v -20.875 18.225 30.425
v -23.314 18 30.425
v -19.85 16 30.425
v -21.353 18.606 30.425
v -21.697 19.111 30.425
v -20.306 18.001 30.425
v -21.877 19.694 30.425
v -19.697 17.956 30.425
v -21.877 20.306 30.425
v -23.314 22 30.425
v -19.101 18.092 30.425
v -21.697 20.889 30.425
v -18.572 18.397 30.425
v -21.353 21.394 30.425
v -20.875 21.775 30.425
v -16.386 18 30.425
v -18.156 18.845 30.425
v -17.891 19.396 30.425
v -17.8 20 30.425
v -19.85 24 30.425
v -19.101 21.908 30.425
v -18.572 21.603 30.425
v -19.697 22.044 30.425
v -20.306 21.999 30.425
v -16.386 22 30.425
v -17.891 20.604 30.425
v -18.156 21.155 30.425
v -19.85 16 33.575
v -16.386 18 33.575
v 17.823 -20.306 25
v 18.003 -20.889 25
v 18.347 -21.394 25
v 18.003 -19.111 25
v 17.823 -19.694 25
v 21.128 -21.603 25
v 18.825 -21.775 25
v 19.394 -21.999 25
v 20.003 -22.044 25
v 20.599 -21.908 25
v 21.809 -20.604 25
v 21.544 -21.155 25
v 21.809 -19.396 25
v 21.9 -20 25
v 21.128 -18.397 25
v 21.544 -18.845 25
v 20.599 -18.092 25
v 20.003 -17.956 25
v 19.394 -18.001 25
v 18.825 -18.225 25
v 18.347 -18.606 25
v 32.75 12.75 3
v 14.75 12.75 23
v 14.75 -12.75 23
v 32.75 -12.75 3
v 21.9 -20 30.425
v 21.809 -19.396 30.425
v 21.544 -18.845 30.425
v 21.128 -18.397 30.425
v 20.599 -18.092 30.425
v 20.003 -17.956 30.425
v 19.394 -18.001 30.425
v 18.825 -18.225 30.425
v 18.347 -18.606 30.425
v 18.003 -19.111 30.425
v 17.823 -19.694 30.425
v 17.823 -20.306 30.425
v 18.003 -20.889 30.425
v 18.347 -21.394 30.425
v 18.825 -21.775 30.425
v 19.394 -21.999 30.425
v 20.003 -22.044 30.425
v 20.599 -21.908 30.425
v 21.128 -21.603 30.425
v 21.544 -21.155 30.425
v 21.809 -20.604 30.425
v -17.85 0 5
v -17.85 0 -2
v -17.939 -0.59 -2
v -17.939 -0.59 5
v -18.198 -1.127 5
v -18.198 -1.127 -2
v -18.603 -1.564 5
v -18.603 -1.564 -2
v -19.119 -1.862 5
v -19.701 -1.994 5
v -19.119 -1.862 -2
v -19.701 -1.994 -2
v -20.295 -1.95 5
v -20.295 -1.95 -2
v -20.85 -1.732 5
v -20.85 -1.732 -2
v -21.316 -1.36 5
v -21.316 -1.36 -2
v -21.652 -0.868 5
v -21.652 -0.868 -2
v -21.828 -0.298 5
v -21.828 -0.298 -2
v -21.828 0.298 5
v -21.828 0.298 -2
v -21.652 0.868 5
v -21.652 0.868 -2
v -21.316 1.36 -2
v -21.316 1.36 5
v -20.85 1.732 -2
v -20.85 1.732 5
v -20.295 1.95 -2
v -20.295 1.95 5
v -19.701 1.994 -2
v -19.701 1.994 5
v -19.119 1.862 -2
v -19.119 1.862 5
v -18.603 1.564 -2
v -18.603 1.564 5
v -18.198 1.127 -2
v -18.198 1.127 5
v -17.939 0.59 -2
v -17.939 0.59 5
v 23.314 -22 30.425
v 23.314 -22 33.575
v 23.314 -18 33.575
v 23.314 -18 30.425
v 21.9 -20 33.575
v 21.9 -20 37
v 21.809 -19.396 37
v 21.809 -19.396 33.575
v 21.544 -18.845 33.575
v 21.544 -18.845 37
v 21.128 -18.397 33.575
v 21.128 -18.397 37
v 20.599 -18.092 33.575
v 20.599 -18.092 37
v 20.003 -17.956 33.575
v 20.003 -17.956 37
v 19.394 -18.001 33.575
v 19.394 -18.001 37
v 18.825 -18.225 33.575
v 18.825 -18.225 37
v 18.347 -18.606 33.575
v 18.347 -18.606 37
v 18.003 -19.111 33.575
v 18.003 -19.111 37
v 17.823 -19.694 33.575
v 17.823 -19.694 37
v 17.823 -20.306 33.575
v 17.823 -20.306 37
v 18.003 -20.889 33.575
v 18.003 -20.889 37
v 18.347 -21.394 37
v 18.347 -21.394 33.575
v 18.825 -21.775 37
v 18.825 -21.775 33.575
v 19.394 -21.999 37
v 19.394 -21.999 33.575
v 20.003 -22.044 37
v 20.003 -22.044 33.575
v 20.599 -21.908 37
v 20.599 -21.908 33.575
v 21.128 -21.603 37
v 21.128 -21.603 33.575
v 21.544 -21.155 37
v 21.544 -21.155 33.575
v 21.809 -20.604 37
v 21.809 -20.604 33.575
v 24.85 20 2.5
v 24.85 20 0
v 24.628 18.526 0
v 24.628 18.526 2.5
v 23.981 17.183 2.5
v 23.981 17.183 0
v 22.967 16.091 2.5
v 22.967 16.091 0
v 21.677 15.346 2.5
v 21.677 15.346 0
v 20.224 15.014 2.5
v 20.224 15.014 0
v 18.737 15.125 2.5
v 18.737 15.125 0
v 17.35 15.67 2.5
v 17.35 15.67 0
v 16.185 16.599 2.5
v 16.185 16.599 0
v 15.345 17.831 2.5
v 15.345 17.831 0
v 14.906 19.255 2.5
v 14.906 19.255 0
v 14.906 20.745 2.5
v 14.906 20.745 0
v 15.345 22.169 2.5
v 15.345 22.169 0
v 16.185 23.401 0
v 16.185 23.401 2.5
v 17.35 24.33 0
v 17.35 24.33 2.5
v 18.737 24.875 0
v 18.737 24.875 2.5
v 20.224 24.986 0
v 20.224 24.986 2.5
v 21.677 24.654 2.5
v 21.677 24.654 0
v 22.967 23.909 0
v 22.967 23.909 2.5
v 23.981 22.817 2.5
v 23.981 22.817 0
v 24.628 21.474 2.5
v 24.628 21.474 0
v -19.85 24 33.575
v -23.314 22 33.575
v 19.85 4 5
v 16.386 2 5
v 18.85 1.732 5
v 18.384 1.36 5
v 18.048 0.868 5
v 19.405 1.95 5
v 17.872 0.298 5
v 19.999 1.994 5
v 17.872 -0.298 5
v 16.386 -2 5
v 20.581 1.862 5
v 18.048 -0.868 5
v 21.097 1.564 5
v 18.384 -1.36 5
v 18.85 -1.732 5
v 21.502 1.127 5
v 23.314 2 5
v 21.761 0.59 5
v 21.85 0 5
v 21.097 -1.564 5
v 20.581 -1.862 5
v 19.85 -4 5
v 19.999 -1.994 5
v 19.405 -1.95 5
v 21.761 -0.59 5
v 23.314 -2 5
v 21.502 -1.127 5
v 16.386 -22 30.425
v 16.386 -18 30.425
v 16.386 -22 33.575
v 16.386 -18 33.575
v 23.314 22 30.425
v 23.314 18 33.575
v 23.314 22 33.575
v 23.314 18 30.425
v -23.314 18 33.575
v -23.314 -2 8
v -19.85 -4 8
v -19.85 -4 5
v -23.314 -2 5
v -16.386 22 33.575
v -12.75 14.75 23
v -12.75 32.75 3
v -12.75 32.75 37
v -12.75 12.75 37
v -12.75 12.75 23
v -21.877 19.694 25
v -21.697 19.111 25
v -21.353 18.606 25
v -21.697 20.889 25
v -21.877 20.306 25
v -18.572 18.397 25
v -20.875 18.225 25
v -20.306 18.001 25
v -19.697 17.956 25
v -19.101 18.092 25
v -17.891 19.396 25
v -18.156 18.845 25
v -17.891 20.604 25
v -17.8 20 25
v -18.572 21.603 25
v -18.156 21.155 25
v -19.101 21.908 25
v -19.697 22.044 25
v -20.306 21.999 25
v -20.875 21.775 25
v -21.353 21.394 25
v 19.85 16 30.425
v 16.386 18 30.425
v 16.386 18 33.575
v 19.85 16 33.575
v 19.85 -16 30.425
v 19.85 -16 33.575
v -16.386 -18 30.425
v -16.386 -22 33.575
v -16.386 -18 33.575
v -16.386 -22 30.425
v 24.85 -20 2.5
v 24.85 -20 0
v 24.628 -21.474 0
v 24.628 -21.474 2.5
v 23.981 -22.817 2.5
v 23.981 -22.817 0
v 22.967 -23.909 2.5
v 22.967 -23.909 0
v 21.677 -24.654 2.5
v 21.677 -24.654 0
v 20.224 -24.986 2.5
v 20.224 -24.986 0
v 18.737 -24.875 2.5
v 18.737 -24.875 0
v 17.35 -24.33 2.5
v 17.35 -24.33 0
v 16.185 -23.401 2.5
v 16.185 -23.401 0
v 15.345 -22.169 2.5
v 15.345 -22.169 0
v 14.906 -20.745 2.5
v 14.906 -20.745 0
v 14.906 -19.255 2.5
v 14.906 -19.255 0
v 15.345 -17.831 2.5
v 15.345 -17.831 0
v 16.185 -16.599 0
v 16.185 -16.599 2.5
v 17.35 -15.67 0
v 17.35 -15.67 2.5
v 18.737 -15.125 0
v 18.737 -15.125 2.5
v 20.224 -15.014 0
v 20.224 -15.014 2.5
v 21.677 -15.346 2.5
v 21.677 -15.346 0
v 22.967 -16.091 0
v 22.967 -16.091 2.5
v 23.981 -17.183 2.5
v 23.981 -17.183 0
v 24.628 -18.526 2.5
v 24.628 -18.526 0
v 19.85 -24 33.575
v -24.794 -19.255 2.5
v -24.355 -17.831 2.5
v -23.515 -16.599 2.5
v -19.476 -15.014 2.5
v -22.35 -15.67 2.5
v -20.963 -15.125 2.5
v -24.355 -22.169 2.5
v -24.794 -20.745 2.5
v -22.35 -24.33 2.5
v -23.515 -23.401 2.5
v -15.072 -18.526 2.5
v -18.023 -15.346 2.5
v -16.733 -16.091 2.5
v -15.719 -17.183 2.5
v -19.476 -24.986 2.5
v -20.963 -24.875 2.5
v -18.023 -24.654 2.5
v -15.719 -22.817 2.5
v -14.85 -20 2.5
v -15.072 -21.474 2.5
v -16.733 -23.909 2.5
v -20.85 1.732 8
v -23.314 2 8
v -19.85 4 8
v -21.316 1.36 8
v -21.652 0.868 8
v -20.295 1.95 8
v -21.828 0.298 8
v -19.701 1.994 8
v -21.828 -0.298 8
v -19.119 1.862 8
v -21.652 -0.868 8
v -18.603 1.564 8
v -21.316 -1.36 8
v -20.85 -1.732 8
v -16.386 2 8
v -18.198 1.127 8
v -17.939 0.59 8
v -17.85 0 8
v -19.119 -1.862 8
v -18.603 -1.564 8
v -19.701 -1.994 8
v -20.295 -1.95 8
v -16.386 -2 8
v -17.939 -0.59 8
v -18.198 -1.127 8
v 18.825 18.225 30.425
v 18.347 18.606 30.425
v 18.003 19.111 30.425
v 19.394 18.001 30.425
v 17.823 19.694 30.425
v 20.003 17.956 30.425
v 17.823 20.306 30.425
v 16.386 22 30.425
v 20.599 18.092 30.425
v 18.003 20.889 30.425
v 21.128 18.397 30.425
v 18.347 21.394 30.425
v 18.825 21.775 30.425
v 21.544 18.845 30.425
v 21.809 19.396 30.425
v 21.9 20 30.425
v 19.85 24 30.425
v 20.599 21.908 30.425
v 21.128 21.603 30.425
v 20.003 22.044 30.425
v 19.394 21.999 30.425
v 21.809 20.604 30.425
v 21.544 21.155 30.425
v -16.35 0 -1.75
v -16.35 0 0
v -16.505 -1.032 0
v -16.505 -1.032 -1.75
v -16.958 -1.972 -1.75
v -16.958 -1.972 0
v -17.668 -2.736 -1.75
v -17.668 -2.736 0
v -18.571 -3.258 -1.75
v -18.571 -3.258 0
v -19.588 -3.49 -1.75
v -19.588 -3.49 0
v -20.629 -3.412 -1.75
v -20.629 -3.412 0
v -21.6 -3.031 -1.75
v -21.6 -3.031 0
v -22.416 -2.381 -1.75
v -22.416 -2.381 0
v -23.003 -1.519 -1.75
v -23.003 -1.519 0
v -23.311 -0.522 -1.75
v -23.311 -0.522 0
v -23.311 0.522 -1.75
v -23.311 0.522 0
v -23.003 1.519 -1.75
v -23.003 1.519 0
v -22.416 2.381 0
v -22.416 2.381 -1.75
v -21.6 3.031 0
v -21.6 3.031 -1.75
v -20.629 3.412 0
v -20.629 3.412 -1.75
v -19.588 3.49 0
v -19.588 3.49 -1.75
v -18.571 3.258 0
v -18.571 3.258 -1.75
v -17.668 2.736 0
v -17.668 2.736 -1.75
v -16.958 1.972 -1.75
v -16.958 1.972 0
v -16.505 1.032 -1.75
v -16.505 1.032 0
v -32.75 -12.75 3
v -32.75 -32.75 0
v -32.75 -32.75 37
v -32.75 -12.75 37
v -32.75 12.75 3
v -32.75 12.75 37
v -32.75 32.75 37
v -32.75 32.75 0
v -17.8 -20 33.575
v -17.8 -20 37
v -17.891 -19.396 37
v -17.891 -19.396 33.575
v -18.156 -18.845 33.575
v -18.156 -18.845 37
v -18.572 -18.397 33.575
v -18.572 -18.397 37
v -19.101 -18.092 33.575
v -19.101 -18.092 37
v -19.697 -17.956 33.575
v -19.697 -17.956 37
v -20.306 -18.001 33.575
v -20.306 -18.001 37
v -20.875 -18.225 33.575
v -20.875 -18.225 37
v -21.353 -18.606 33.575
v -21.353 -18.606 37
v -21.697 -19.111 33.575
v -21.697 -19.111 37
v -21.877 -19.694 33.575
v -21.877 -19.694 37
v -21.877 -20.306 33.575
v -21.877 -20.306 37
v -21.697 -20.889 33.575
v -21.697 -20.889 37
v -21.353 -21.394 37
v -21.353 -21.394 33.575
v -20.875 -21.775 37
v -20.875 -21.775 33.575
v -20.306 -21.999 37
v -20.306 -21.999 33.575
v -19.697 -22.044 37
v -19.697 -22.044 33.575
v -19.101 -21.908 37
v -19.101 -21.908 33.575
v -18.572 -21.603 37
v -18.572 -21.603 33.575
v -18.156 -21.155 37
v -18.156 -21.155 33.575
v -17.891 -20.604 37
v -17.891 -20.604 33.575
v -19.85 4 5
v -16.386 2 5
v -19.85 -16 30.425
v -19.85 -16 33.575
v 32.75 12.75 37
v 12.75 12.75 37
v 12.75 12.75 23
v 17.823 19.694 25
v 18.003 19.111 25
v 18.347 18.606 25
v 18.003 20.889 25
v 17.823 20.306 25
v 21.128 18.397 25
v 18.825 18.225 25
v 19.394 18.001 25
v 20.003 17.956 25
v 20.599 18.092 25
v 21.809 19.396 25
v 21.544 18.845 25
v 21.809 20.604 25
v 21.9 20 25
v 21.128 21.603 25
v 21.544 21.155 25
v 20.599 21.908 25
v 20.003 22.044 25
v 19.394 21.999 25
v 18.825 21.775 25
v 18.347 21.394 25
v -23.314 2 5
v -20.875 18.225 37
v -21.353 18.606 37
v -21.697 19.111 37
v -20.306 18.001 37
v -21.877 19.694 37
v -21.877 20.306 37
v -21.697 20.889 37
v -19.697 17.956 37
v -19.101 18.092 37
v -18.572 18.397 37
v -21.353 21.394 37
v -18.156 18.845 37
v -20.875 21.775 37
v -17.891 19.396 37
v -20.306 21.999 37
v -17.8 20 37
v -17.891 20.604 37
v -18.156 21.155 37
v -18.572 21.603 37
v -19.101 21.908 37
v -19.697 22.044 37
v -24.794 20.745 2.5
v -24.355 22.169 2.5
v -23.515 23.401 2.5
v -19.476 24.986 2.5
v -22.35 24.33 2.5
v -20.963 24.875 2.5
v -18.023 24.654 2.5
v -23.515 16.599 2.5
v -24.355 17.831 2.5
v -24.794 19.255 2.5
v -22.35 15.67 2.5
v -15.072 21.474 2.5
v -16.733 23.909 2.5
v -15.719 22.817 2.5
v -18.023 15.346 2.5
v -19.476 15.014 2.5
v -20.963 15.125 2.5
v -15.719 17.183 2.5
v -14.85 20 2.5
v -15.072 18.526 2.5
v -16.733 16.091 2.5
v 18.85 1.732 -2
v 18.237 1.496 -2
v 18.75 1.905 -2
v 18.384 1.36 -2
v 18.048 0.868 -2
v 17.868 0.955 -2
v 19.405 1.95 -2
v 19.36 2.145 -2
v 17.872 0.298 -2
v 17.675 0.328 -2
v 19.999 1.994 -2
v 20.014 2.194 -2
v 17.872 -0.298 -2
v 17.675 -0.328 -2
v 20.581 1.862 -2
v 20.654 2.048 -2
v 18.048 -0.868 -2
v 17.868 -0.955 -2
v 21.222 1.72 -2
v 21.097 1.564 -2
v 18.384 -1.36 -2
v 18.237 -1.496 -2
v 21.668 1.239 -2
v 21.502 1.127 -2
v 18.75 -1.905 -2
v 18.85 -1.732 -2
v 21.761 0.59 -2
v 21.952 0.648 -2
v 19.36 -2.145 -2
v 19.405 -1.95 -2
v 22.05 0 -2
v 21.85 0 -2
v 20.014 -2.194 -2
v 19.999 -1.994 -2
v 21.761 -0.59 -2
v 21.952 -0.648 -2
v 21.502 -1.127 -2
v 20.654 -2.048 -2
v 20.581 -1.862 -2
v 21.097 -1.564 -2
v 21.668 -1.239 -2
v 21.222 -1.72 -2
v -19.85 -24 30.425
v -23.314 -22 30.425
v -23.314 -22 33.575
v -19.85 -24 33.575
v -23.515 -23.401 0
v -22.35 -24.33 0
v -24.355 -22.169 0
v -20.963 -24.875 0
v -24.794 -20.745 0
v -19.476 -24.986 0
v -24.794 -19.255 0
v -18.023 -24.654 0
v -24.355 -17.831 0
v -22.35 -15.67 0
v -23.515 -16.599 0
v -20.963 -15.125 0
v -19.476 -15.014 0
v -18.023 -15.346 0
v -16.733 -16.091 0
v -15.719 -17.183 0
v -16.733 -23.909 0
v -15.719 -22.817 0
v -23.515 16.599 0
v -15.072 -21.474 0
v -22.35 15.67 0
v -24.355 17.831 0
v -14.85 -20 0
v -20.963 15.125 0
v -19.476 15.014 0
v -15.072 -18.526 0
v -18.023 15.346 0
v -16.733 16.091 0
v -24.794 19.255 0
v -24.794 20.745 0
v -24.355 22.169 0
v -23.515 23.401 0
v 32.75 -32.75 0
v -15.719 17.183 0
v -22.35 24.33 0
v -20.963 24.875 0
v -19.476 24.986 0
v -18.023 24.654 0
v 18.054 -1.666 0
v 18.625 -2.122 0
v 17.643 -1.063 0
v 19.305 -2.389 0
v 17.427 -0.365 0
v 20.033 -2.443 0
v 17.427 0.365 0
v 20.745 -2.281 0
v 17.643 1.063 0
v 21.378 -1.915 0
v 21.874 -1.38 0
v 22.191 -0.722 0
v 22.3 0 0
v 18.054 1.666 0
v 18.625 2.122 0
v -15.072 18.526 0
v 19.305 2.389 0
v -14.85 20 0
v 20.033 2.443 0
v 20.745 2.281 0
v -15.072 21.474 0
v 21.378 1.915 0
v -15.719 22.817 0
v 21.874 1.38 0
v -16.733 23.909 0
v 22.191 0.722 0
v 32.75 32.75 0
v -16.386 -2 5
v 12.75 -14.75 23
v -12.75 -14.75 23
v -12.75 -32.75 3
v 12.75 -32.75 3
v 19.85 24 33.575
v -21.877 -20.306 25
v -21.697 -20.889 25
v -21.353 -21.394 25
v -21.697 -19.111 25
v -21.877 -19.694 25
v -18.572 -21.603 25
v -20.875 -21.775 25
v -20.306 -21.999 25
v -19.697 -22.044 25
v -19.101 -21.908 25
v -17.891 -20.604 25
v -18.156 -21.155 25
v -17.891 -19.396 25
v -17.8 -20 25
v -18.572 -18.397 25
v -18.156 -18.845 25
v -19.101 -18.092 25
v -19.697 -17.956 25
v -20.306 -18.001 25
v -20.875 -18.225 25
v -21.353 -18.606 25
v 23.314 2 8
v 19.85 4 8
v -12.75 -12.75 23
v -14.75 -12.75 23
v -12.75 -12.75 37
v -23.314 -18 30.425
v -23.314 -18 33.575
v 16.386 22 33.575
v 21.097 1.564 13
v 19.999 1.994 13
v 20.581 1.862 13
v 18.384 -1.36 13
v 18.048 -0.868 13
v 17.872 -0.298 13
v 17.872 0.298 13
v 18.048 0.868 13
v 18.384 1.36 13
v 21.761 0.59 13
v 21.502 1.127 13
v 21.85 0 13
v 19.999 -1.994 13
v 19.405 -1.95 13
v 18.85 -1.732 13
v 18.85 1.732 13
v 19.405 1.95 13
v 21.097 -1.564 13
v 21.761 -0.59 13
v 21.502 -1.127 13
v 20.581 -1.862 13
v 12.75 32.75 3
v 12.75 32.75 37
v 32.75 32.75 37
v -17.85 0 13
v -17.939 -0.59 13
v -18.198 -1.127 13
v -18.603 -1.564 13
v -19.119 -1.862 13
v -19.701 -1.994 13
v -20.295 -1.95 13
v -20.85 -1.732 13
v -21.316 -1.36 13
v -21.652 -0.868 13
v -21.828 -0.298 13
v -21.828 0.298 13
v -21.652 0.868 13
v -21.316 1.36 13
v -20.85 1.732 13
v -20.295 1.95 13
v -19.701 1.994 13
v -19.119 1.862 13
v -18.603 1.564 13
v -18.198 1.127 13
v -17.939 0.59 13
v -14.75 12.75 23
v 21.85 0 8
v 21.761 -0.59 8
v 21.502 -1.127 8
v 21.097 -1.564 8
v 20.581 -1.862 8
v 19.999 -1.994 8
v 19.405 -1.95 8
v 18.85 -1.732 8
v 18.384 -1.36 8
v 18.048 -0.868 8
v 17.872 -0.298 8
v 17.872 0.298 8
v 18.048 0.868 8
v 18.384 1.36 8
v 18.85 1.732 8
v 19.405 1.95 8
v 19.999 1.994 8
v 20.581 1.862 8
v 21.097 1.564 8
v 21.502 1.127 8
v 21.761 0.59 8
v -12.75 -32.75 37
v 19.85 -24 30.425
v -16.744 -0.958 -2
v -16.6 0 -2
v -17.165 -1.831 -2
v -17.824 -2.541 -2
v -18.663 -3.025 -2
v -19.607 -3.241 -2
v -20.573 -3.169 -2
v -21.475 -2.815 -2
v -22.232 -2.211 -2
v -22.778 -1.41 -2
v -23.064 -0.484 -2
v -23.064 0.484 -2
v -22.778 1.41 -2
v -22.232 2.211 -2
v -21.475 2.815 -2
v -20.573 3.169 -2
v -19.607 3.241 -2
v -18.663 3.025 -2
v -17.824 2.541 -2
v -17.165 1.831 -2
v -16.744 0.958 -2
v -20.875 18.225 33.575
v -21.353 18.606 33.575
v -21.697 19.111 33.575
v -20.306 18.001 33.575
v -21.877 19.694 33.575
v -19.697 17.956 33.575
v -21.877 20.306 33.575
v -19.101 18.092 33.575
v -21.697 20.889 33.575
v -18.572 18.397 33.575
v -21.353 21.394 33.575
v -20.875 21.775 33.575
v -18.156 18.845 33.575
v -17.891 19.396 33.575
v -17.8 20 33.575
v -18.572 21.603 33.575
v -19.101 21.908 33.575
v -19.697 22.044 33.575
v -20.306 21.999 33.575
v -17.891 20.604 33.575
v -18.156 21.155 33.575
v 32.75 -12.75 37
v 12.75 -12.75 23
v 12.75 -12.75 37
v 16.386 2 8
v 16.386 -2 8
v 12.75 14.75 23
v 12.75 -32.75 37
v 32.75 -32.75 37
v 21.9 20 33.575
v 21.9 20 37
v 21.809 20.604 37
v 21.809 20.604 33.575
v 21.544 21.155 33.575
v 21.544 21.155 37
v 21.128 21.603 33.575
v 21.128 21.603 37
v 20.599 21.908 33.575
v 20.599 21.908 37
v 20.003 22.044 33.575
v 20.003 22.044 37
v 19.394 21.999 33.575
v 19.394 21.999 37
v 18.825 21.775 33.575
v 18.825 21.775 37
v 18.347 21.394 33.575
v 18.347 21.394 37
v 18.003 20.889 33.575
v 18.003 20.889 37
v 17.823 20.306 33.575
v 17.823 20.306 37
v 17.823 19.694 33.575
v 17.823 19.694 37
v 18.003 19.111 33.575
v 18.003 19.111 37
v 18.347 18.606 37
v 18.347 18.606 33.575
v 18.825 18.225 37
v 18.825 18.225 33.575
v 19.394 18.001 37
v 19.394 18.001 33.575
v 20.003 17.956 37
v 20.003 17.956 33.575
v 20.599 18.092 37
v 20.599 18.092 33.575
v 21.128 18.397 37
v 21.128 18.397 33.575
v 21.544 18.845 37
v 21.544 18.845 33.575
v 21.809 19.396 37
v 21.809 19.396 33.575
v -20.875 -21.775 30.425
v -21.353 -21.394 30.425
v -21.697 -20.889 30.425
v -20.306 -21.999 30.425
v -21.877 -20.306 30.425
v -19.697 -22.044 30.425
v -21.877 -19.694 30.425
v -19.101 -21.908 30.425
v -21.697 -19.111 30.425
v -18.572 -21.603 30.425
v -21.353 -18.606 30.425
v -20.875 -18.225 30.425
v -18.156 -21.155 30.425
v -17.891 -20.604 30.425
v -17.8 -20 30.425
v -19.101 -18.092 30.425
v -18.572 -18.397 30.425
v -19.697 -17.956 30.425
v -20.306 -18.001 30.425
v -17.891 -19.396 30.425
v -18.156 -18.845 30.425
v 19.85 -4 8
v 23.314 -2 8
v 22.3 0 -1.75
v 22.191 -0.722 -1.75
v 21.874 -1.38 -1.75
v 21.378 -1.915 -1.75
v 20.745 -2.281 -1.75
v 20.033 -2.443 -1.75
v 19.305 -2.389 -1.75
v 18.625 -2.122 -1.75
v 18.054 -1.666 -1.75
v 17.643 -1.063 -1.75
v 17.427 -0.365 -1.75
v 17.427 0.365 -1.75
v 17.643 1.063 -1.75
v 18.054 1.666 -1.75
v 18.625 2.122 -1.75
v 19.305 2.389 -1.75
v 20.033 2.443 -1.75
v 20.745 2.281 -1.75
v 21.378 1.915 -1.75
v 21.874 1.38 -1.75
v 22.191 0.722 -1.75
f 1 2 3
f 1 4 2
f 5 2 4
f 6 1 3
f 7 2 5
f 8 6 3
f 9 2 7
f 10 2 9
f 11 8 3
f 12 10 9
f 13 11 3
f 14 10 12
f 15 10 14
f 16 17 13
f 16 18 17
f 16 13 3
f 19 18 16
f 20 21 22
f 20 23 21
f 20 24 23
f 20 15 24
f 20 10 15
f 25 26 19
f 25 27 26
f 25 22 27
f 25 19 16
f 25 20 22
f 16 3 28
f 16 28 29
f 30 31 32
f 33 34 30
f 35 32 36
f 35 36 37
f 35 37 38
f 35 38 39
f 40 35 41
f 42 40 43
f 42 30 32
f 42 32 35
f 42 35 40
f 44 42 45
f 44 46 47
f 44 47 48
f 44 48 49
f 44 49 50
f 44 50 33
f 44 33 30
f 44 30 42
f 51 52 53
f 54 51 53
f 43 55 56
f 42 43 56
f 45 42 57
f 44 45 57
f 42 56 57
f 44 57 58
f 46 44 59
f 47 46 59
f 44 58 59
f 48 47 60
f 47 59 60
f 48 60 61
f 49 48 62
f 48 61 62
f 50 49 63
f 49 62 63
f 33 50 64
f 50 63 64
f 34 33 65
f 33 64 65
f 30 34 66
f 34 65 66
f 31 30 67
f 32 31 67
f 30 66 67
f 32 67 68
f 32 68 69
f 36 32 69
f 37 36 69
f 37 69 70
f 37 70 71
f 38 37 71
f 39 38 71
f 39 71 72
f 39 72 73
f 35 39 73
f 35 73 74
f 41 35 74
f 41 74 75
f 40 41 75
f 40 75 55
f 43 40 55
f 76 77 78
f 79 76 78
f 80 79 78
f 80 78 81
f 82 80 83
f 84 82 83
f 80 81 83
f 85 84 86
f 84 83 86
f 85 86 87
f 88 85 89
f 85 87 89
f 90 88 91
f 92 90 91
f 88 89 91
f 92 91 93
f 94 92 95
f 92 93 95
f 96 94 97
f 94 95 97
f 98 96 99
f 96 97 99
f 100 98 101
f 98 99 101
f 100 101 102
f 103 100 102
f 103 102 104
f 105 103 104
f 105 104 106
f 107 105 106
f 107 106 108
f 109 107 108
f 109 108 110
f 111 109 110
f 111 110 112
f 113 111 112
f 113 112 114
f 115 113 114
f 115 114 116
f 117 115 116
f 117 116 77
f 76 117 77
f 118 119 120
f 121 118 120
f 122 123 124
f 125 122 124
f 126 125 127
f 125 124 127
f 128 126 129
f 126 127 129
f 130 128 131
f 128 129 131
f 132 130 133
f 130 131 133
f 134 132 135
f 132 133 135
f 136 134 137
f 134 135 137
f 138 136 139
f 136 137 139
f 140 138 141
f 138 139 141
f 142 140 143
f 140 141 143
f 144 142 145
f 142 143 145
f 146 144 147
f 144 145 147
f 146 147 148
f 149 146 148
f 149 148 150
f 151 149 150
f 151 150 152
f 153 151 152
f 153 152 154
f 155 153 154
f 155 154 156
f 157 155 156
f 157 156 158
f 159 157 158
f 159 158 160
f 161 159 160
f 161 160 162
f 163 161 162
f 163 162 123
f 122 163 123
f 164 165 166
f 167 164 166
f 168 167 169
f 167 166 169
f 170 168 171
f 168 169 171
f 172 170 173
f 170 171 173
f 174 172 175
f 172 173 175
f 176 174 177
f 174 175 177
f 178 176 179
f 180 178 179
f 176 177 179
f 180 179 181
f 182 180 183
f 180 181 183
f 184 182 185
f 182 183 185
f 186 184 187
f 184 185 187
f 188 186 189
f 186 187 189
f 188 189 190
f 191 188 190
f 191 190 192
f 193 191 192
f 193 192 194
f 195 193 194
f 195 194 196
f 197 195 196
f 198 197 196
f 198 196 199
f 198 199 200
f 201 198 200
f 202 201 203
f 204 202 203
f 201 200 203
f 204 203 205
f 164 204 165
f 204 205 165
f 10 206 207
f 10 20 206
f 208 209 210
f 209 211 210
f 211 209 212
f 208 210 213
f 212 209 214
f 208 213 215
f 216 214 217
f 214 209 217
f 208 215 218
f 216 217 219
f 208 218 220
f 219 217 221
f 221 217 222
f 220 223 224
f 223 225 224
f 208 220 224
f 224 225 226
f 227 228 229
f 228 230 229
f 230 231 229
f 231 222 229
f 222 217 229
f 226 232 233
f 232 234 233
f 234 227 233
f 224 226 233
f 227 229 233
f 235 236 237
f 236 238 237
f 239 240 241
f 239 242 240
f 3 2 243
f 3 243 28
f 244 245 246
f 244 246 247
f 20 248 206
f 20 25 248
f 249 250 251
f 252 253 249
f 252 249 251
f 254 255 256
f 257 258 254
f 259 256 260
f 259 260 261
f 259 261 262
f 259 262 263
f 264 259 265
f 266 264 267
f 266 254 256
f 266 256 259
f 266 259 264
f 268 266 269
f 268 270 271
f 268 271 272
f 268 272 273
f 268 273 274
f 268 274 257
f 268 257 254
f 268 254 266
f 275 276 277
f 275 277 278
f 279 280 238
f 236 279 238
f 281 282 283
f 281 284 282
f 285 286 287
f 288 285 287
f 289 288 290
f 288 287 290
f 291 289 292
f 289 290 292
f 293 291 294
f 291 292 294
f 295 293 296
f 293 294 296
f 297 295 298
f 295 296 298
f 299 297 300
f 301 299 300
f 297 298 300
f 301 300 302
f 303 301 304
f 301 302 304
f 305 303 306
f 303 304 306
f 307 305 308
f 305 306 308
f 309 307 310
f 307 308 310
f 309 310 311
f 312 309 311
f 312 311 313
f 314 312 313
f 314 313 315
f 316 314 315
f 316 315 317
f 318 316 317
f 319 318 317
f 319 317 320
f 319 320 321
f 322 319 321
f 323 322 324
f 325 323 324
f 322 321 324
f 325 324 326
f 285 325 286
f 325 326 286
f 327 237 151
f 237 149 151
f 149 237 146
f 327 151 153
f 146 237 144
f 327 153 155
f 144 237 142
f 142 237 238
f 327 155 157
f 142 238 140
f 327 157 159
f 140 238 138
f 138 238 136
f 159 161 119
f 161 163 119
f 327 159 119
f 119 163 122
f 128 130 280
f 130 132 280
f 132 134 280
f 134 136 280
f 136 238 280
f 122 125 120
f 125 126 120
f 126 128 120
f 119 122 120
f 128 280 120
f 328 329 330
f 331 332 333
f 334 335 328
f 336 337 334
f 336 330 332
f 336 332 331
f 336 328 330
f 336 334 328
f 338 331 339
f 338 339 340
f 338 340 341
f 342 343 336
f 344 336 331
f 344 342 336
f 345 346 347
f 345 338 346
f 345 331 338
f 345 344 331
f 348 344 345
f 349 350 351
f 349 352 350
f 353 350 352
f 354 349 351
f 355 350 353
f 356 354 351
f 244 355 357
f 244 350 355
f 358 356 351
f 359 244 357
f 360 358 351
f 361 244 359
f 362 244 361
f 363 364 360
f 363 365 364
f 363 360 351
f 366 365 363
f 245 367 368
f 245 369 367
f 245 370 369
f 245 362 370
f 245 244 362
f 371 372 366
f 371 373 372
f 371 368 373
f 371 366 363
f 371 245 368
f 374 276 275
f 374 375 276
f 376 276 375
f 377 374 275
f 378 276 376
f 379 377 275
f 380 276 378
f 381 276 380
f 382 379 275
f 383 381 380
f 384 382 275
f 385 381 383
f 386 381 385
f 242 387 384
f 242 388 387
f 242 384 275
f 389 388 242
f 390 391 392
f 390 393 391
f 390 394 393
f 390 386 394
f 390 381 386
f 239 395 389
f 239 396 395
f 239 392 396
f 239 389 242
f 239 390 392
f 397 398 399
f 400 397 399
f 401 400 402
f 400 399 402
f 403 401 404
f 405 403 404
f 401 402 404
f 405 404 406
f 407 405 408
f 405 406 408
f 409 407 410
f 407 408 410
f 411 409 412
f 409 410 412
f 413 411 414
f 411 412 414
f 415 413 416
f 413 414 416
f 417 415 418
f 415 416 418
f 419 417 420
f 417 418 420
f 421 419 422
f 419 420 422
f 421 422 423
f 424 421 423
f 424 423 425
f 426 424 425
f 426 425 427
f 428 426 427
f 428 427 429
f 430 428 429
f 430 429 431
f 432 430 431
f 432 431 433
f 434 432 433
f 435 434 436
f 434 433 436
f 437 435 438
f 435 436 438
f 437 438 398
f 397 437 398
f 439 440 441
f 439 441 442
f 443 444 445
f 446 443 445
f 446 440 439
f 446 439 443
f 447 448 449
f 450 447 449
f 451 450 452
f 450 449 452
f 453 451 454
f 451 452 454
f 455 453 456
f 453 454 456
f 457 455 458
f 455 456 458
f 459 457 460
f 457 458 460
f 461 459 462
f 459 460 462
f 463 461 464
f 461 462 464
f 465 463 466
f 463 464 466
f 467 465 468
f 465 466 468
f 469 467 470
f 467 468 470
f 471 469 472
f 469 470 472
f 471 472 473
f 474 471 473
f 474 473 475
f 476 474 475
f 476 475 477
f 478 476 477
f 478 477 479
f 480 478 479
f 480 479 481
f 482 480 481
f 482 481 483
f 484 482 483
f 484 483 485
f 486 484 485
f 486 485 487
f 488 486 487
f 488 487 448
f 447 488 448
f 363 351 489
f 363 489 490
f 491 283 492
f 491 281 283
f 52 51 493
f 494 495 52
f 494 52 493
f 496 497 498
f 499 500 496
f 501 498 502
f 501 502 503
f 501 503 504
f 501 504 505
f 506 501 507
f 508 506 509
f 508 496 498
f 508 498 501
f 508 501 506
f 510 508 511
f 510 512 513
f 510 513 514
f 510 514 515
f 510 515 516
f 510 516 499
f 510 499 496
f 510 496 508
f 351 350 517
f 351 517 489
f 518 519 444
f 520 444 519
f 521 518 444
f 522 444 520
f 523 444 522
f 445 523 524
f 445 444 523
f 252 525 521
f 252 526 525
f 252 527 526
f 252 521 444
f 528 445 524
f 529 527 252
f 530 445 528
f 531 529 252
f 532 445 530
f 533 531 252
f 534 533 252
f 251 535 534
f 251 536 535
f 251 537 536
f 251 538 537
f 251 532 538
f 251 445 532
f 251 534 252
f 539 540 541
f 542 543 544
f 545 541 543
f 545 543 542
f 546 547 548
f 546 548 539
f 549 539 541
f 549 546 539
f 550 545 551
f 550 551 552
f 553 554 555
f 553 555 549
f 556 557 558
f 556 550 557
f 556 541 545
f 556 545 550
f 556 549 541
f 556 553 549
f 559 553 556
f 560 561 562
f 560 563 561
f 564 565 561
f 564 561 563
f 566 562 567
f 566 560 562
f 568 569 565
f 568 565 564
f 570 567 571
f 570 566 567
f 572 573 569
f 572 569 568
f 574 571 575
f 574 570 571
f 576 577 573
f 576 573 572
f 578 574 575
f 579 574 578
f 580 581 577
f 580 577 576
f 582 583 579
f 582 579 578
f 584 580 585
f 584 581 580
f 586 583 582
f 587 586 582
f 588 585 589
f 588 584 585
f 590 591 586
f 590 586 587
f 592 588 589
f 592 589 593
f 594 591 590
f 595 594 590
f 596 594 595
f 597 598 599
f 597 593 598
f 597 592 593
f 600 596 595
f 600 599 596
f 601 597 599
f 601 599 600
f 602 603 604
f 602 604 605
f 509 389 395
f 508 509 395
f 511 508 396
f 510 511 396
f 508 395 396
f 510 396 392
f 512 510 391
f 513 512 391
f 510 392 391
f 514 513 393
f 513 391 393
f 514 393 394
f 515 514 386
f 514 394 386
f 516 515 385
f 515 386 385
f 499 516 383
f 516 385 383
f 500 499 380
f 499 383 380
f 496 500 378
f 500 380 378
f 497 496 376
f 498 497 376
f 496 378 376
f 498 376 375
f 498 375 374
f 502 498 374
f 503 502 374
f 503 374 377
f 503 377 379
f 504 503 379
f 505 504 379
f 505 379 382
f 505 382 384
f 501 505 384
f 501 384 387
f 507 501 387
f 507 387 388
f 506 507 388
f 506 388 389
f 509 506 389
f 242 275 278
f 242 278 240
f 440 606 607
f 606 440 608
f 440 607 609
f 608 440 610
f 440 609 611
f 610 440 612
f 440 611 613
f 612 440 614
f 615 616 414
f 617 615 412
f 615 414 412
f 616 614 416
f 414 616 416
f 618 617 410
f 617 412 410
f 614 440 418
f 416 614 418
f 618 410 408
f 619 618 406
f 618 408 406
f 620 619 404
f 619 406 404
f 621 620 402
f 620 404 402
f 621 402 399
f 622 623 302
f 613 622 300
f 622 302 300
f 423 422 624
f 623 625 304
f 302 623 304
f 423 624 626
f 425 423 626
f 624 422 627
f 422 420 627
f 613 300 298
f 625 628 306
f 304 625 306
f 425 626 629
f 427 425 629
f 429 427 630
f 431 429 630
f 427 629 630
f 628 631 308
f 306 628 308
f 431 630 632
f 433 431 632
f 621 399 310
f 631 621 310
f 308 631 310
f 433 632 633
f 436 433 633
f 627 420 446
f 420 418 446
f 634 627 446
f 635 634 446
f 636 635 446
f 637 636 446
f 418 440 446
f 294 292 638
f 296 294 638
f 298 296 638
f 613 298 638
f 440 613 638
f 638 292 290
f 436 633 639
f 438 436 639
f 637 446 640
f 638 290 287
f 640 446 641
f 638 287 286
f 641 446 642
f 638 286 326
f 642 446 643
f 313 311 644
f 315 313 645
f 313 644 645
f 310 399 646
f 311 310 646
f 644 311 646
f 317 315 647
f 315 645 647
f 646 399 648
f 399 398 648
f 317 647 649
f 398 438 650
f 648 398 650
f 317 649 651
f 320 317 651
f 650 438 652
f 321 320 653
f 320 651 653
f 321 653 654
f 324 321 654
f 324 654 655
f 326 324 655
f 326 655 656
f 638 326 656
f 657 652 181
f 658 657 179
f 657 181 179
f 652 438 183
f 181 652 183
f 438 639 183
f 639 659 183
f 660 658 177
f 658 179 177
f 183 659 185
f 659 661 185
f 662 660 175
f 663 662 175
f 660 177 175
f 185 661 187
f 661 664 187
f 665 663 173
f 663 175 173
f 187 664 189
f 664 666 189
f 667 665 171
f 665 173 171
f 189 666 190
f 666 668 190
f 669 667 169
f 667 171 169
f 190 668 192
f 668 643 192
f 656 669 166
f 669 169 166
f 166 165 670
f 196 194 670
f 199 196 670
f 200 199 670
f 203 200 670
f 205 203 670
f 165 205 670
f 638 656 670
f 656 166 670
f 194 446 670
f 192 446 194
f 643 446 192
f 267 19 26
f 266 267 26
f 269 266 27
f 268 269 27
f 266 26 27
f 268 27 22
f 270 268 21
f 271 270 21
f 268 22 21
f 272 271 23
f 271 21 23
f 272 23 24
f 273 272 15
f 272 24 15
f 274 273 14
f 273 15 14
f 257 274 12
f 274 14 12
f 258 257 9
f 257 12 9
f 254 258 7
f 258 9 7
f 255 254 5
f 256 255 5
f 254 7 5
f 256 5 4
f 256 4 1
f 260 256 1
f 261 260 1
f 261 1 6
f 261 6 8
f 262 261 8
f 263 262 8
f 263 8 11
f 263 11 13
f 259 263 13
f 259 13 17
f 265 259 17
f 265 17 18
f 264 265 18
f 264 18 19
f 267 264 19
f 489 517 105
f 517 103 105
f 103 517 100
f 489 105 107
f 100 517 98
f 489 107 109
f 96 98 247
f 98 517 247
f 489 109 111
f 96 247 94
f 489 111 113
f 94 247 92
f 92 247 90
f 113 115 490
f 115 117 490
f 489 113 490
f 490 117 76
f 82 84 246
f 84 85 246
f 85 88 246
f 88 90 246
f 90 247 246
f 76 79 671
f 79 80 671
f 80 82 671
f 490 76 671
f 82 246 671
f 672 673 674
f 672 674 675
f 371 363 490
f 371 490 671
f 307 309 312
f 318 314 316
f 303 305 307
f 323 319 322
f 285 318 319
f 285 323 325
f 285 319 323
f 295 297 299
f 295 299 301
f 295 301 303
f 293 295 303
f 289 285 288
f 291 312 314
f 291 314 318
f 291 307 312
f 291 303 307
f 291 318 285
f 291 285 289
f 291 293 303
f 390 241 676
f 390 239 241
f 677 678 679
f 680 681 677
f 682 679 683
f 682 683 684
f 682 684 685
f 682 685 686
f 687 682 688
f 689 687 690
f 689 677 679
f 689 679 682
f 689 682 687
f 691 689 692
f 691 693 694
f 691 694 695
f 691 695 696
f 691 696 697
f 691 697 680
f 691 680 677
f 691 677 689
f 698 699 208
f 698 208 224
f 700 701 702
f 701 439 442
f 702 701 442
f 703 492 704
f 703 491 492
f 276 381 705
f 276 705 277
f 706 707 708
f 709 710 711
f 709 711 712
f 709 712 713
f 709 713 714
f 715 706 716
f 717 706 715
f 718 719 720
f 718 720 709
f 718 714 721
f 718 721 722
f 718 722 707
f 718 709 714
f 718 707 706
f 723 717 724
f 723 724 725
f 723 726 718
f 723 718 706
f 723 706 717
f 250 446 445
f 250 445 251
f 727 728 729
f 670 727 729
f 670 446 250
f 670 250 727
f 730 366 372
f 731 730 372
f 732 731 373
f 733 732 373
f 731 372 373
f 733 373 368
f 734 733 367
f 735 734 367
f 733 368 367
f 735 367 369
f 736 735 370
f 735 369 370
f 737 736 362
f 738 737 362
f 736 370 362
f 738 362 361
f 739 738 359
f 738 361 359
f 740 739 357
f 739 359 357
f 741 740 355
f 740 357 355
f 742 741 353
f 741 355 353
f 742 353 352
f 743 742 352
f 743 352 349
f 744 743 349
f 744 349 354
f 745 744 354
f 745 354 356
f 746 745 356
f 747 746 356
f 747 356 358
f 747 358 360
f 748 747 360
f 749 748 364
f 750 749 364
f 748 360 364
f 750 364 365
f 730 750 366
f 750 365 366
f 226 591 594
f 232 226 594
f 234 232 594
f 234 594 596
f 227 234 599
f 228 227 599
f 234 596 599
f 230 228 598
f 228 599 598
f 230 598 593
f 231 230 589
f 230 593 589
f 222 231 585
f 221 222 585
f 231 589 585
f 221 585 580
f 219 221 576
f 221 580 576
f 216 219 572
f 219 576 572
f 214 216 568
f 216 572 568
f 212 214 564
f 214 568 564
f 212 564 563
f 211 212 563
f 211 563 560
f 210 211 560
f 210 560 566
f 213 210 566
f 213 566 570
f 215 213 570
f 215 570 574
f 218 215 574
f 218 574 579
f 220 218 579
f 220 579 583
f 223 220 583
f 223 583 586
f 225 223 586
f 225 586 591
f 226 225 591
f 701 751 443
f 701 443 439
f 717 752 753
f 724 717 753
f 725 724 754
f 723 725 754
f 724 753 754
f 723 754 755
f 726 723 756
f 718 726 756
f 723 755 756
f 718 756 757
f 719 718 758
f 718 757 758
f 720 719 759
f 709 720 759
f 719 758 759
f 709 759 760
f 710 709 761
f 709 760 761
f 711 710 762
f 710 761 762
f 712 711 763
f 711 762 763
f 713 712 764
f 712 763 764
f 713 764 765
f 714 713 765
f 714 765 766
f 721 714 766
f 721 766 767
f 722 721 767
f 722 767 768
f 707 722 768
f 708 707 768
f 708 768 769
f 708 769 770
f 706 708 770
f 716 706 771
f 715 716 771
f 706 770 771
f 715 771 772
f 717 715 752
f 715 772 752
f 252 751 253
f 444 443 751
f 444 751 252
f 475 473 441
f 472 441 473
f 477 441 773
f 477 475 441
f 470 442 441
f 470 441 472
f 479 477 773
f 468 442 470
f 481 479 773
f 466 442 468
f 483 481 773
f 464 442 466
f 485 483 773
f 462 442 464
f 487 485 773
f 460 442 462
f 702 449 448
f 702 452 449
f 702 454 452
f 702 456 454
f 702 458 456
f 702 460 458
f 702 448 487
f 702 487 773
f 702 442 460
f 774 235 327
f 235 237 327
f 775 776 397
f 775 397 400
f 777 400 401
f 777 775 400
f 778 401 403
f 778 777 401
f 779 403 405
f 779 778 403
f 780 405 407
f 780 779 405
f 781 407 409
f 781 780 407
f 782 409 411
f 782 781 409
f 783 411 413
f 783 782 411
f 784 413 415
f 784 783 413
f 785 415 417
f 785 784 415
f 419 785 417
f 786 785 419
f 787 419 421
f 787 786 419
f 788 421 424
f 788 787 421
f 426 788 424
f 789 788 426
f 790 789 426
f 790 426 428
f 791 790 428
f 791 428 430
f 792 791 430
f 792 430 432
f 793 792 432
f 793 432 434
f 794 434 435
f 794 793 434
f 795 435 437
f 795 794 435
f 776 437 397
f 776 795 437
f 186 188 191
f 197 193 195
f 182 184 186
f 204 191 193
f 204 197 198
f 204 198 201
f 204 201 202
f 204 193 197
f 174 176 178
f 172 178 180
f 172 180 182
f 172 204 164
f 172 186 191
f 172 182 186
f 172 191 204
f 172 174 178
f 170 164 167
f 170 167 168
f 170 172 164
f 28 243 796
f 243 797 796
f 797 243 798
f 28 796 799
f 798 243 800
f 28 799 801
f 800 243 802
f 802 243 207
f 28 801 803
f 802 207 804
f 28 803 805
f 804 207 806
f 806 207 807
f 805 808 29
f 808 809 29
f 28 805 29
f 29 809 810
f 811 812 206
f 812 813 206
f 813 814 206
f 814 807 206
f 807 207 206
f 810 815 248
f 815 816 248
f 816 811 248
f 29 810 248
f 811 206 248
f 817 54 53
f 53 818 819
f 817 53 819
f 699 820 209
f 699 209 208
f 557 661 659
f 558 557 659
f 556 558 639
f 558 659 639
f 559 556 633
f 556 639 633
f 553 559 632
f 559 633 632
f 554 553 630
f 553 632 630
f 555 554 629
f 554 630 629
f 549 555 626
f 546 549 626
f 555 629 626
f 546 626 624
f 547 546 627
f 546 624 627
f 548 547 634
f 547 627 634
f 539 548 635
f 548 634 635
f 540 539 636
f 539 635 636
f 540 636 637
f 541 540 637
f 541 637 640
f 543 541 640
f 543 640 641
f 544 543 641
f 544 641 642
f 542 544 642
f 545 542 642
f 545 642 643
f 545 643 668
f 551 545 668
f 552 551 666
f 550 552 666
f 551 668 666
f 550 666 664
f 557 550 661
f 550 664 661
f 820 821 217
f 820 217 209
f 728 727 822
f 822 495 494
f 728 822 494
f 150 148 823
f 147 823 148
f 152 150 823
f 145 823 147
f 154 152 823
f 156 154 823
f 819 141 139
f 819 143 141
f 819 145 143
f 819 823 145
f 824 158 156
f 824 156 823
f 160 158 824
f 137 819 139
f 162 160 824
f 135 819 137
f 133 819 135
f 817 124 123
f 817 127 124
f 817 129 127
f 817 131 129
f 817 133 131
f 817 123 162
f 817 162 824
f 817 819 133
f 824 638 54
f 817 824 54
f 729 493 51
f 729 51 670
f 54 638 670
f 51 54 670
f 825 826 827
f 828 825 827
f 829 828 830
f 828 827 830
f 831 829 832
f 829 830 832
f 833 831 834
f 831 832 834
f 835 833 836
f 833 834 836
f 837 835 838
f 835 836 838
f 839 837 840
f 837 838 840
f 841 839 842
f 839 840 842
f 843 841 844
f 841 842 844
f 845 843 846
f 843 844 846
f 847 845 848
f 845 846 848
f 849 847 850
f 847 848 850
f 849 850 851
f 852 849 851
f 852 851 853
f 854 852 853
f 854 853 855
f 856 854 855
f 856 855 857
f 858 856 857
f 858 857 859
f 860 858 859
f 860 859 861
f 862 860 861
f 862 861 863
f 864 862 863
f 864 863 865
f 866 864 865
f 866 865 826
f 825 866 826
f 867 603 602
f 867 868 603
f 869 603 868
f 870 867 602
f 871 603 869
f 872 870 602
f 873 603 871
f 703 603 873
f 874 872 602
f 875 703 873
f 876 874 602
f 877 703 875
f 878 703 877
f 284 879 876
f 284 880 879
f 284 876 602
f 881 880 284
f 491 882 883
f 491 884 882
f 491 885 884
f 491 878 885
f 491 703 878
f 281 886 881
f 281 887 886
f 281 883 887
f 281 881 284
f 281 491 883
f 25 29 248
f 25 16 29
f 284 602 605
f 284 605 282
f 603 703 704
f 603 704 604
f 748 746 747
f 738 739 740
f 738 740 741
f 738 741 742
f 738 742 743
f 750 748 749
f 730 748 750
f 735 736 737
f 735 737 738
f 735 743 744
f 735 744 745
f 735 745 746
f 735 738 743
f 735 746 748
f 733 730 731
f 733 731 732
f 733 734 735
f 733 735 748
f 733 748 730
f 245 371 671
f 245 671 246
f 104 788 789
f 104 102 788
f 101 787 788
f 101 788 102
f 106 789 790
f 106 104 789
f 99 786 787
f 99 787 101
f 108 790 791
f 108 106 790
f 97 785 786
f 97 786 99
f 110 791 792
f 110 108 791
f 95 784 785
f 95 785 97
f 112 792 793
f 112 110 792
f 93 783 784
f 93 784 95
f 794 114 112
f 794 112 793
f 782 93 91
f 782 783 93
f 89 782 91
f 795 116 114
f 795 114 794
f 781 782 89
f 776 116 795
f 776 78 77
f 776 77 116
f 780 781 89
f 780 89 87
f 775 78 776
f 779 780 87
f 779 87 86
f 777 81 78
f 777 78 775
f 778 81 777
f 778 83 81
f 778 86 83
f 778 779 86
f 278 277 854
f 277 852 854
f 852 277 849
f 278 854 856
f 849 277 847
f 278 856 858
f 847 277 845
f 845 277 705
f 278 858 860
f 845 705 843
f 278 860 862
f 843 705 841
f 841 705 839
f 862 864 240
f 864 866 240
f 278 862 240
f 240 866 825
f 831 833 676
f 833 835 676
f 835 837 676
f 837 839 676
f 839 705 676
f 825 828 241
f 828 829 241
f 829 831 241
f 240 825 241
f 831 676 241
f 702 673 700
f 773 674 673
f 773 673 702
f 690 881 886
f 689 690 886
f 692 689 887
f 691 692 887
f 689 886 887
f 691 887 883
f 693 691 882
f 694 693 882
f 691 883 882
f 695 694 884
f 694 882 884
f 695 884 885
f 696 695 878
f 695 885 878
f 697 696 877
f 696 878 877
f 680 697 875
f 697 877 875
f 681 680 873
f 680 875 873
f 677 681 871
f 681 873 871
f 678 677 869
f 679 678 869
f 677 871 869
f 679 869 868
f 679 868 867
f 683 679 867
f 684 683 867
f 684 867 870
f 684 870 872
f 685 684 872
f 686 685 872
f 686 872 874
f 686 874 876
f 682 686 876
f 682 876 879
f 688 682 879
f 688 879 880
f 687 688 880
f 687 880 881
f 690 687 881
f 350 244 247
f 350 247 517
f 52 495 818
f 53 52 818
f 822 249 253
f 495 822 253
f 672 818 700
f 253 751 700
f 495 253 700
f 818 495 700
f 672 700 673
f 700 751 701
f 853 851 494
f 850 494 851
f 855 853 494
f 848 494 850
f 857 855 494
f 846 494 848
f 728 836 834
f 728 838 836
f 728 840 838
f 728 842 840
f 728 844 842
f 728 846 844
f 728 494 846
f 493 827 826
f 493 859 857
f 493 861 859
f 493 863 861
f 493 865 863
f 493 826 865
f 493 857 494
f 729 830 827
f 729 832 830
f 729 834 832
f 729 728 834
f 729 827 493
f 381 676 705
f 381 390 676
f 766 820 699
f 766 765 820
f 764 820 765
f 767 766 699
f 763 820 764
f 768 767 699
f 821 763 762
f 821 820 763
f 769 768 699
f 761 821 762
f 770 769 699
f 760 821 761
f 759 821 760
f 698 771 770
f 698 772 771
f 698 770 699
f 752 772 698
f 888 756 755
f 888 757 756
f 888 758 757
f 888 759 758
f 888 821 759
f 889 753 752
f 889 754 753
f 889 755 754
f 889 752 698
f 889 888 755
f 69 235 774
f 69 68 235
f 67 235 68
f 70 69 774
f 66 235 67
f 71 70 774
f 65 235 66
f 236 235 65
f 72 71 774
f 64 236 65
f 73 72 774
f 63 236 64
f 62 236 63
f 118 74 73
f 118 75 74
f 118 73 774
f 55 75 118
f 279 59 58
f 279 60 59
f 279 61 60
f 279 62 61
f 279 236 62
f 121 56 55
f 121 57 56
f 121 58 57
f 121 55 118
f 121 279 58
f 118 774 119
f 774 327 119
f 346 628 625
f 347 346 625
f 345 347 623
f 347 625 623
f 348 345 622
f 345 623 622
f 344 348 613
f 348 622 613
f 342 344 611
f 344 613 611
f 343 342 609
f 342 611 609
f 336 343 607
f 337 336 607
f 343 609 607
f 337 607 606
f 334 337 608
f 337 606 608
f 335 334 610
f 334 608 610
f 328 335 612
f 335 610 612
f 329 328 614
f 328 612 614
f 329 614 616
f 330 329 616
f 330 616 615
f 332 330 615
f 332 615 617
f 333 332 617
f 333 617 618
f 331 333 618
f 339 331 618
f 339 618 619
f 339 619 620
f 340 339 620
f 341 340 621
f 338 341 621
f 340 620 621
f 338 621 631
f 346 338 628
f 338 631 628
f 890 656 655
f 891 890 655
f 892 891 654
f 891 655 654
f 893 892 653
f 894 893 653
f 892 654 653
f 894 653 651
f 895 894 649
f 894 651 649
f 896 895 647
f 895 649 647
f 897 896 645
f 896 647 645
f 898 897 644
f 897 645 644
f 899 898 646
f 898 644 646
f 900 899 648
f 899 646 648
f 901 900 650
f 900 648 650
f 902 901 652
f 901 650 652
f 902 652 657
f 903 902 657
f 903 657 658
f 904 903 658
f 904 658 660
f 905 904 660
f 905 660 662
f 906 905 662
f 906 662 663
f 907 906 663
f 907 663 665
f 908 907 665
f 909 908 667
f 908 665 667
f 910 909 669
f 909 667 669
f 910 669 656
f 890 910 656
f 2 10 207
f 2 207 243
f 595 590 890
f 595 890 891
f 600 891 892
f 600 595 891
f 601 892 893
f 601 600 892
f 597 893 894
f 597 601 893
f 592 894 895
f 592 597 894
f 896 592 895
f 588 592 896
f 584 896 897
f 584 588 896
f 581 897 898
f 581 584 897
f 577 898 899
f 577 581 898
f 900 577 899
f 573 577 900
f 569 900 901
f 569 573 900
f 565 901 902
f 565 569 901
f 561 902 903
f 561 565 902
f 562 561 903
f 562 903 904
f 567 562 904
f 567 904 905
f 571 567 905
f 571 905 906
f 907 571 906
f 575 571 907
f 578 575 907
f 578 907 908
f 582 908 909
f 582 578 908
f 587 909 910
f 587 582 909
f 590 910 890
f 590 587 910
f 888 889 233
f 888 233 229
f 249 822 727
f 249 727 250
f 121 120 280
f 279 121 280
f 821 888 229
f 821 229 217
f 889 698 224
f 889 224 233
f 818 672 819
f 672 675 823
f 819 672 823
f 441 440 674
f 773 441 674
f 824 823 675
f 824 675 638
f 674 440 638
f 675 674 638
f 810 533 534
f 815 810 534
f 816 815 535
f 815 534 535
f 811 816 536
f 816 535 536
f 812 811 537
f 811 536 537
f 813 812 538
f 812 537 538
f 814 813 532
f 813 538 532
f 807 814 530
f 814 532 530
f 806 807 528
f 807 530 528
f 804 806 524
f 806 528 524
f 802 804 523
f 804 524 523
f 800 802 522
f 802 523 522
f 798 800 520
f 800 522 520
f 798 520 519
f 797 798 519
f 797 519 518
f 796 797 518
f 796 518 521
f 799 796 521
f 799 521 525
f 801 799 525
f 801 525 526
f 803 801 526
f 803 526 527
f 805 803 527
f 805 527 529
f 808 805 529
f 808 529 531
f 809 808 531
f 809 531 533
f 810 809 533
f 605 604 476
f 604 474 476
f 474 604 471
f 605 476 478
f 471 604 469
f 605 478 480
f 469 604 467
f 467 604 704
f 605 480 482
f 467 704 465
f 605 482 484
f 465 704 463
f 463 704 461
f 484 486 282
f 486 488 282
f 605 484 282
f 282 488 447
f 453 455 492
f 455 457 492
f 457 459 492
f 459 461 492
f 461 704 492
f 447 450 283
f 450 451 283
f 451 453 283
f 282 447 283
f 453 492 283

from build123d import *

# Parameters (mm, degrees)
SKETCH_W        = 65.5
SKETCH_H        = 65.5
PAD_DEPTH       = 37
SKETCH001_W     = 25.5
SKETCH001_H     = 14
POCKET_DEPTH    = 65.501
SKETCH002_W     = 25.5
SKETCH002_H     = 14
POCKET001_DEPTH = 65.501
CHAMFER_1_SIZE2 = 18
CHAMFER_1_SIZE  = 20
CHAMFER_2_SIZE2 = 18
CHAMFER_2_SIZE  = 20
CHAMFER_3_SIZE2 = 18
CHAMFER_3_SIZE  = 20
CHAMFER_4_SIZE2 = 18
CHAMFER_4_SIZE  = 20
SKETCH003_R     = 5
POCKET002_DEPTH = 2.5
SKETCH004_R     = 3.5
SKETCH004_R_2   = 2.45
PAD001_DEPTH    = 2
SKETCH005_R     = 2
POCKET003_DEPTH = 10
CHAMFER001_SIZE = 0.25
POCKET004_DEPTH = 3
SKETCH007_R     = 2.05
POCKET005_DEPTH = 12
POCKET006_DEPTH = 1.575
SKETCH009_R     = 2
POCKET007_DEPTH = 5


with BuildPart() as part:
    # Sketch → Pad (new body)
    with BuildSketch(Plane.XY):
        Rectangle(SKETCH_W, SKETCH_H)
    extrude(amount=PAD_DEPTH)

    # Sketch001 (on Face3 of Pad) → Pocket (cut, through all)
    with BuildSketch(Plane.XZ.offset(32.75)):
        with Locations((0, 30)):
            Rectangle(SKETCH001_W, SKETCH001_H)
    extrude(amount=-POCKET_DEPTH, mode=Mode.SUBTRACT)

    # Sketch002 (on Face9 of Pocket) → Pocket001 (cut, through all)
    with BuildSketch(Plane(origin=(-32.75, 0, 0), x_dir=(0, -1, 0), z_dir=(-1, 0, 0))):
        with Locations((0, 30)):
            Rectangle(SKETCH002_W, SKETCH002_H)
    extrude(amount=-POCKET001_DEPTH, mode=Mode.SUBTRACT)

    # Chamfer 1
    chamfer_1_edges = [part.edges().sort_by_distance(p)[0] for p in [
        (0, 32.75, 23),
    ]]
    chamfer_1_side = part.faces().sort_by_distance((0, 32.75, 16.513308))[0]
    chamfer(chamfer_1_edges, length=CHAMFER_1_SIZE, length2=CHAMFER_1_SIZE2, reference=chamfer_1_side)

    # Chamfer 2
    chamfer_2_edges = [part.edges().sort_by_distance(p)[0] for p in [
        (0, -32.75, 23),
    ]]
    chamfer_2_side = part.faces().sort_by_distance((0, -32.75, 16.513308))[0]
    chamfer(chamfer_2_edges, length=CHAMFER_2_SIZE, length2=CHAMFER_2_SIZE2, reference=chamfer_2_side)

    # Chamfer 3
    chamfer_3_edges = [part.edges().sort_by_distance(p)[0] for p in [
        (-32.75, 0, 23),
    ]]
    chamfer_3_side = part.faces().sort_by_distance((-32.75, 0, 16.513308))[0]
    chamfer(chamfer_3_edges, length=CHAMFER_3_SIZE, length2=CHAMFER_3_SIZE2, reference=chamfer_3_side)

    # Chamfer 4
    chamfer_4_edges = [part.edges().sort_by_distance(p)[0] for p in [
        (32.75, 0, 23),
    ]]
    chamfer_4_side = part.faces().sort_by_distance((32.75, 0, 16.513308))[0]
    chamfer(chamfer_4_edges, length=CHAMFER_4_SIZE, length2=CHAMFER_4_SIZE2, reference=chamfer_4_side)

    # Sketch003 (on Face7 of Chamfer) → Pocket002 (cut)
    with BuildSketch(Plane(origin=(0, 0, 0), x_dir=(1, 0, 0), z_dir=(0, 0, -1))):
        with Locations((-19.85, 20)):
            Circle(SKETCH003_R)
        with Locations((19.85, 20)):
            Circle(SKETCH003_R)
        with Locations((-19.85, -20)):
            Circle(SKETCH003_R)
        with Locations((19.85, -20)):
            Circle(SKETCH003_R)
    extrude(amount=-POCKET002_DEPTH, mode=Mode.SUBTRACT)

    # Sketch004 (on Face7 of Pocket002) → Pad001 (join)
    with BuildSketch(Plane(origin=(0, 0, 0), x_dir=(1, 0, 0), z_dir=(0, 0, -1))):
        with Locations((-19.85, 0)):
            Circle(SKETCH004_R)
        with Locations((19.85, 0)):
            Circle(SKETCH004_R_2)
    extrude(amount=PAD001_DEPTH)

    # Sketch005 (on Face34 of Pad001) → Pocket003 (cut)
    with BuildSketch(Plane(origin=(0, 0, -2), x_dir=(1, 0, 0), z_dir=(0, 0, -1))):
        with Locations((-19.85, 0)):
            Circle(SKETCH005_R)
        with Locations((19.85, 0)):
            Circle(SKETCH005_R)
    extrude(amount=-POCKET003_DEPTH, mode=Mode.SUBTRACT)

    # Chamfer001
    chamfer001_edges = [part.edges().sort_by_distance(p)[0] for p in [
        (-23.35, 0, -2),
        (17.4, 0, -2),
    ]]
    chamfer(chamfer001_edges, length=CHAMFER001_SIZE)

    # Sketch006 (on Face36 of Chamfer001) → Pocket004 (cut)
    with BuildSketch(Plane(origin=(0, 0, 8), x_dir=(1, 0, 0), z_dir=(0, 0, -1))):
        Polygon((-19.85, -4), (-16.385898, -2), (-16.385898, 2), (-19.85, 4), (-23.314102, 2), (-23.314102, -2), align=None)
        Polygon((19.85, -4), (23.314102, -2), (23.314102, 2), (19.85, 4), (16.385898, 2), (16.385898, -2), align=None)
    extrude(amount=POCKET004_DEPTH, mode=Mode.SUBTRACT)

    # Sketch007 (on Face22 of Pocket004) → Pocket005 (cut)
    with BuildSketch(Plane.XY.offset(37)):
        with Locations((-19.85, 20)):
            Circle(SKETCH007_R)
        with Locations((19.85, 20)):
            Circle(SKETCH007_R)
        with Locations((-19.85, -20)):
            Circle(SKETCH007_R)
        with Locations((19.85, -20)):
            Circle(SKETCH007_R)
    extrude(amount=-POCKET005_DEPTH, mode=Mode.SUBTRACT)

    # Sketch008 (on DatumPlane) → Pocket006 (cut, symmetric)
    with BuildSketch(Plane.XY.offset(32)):
        Polygon((-19.85, 16), (-16.385898, 18), (-16.385898, 22), (-19.85, 24), (-23.314102, 22), (-23.314102, 18), align=None)
        Polygon((-19.85, -24), (-16.385898, -22), (-16.385898, -18), (-19.85, -16), (-23.314102, -18), (-23.314102, -22), align=None)
        Polygon((19.85, 16), (23.314102, 18), (23.314102, 22), (19.85, 24), (16.385898, 22), (16.385898, 18), align=None)
        Polygon((19.85, -24), (23.314102, -22), (23.314102, -18), (19.85, -16), (16.385898, -18), (16.385898, -22), align=None)
    extrude(amount=POCKET006_DEPTH, both=True, mode=Mode.SUBTRACT)

    # Sketch009 (on Face104 of Pocket006) → Pocket007 (cut)
    with BuildSketch(Plane(origin=(0, 0, 8), x_dir=(1, 0, 0), z_dir=(0, 0, -1))):
        with Locations((-19.85, 0)):
            Circle(SKETCH009_R)
        with Locations((19.85, 0)):
            Circle(SKETCH009_R)
    extrude(amount=-POCKET007_DEPTH, mode=Mode.SUBTRACT)


solid = part.part
